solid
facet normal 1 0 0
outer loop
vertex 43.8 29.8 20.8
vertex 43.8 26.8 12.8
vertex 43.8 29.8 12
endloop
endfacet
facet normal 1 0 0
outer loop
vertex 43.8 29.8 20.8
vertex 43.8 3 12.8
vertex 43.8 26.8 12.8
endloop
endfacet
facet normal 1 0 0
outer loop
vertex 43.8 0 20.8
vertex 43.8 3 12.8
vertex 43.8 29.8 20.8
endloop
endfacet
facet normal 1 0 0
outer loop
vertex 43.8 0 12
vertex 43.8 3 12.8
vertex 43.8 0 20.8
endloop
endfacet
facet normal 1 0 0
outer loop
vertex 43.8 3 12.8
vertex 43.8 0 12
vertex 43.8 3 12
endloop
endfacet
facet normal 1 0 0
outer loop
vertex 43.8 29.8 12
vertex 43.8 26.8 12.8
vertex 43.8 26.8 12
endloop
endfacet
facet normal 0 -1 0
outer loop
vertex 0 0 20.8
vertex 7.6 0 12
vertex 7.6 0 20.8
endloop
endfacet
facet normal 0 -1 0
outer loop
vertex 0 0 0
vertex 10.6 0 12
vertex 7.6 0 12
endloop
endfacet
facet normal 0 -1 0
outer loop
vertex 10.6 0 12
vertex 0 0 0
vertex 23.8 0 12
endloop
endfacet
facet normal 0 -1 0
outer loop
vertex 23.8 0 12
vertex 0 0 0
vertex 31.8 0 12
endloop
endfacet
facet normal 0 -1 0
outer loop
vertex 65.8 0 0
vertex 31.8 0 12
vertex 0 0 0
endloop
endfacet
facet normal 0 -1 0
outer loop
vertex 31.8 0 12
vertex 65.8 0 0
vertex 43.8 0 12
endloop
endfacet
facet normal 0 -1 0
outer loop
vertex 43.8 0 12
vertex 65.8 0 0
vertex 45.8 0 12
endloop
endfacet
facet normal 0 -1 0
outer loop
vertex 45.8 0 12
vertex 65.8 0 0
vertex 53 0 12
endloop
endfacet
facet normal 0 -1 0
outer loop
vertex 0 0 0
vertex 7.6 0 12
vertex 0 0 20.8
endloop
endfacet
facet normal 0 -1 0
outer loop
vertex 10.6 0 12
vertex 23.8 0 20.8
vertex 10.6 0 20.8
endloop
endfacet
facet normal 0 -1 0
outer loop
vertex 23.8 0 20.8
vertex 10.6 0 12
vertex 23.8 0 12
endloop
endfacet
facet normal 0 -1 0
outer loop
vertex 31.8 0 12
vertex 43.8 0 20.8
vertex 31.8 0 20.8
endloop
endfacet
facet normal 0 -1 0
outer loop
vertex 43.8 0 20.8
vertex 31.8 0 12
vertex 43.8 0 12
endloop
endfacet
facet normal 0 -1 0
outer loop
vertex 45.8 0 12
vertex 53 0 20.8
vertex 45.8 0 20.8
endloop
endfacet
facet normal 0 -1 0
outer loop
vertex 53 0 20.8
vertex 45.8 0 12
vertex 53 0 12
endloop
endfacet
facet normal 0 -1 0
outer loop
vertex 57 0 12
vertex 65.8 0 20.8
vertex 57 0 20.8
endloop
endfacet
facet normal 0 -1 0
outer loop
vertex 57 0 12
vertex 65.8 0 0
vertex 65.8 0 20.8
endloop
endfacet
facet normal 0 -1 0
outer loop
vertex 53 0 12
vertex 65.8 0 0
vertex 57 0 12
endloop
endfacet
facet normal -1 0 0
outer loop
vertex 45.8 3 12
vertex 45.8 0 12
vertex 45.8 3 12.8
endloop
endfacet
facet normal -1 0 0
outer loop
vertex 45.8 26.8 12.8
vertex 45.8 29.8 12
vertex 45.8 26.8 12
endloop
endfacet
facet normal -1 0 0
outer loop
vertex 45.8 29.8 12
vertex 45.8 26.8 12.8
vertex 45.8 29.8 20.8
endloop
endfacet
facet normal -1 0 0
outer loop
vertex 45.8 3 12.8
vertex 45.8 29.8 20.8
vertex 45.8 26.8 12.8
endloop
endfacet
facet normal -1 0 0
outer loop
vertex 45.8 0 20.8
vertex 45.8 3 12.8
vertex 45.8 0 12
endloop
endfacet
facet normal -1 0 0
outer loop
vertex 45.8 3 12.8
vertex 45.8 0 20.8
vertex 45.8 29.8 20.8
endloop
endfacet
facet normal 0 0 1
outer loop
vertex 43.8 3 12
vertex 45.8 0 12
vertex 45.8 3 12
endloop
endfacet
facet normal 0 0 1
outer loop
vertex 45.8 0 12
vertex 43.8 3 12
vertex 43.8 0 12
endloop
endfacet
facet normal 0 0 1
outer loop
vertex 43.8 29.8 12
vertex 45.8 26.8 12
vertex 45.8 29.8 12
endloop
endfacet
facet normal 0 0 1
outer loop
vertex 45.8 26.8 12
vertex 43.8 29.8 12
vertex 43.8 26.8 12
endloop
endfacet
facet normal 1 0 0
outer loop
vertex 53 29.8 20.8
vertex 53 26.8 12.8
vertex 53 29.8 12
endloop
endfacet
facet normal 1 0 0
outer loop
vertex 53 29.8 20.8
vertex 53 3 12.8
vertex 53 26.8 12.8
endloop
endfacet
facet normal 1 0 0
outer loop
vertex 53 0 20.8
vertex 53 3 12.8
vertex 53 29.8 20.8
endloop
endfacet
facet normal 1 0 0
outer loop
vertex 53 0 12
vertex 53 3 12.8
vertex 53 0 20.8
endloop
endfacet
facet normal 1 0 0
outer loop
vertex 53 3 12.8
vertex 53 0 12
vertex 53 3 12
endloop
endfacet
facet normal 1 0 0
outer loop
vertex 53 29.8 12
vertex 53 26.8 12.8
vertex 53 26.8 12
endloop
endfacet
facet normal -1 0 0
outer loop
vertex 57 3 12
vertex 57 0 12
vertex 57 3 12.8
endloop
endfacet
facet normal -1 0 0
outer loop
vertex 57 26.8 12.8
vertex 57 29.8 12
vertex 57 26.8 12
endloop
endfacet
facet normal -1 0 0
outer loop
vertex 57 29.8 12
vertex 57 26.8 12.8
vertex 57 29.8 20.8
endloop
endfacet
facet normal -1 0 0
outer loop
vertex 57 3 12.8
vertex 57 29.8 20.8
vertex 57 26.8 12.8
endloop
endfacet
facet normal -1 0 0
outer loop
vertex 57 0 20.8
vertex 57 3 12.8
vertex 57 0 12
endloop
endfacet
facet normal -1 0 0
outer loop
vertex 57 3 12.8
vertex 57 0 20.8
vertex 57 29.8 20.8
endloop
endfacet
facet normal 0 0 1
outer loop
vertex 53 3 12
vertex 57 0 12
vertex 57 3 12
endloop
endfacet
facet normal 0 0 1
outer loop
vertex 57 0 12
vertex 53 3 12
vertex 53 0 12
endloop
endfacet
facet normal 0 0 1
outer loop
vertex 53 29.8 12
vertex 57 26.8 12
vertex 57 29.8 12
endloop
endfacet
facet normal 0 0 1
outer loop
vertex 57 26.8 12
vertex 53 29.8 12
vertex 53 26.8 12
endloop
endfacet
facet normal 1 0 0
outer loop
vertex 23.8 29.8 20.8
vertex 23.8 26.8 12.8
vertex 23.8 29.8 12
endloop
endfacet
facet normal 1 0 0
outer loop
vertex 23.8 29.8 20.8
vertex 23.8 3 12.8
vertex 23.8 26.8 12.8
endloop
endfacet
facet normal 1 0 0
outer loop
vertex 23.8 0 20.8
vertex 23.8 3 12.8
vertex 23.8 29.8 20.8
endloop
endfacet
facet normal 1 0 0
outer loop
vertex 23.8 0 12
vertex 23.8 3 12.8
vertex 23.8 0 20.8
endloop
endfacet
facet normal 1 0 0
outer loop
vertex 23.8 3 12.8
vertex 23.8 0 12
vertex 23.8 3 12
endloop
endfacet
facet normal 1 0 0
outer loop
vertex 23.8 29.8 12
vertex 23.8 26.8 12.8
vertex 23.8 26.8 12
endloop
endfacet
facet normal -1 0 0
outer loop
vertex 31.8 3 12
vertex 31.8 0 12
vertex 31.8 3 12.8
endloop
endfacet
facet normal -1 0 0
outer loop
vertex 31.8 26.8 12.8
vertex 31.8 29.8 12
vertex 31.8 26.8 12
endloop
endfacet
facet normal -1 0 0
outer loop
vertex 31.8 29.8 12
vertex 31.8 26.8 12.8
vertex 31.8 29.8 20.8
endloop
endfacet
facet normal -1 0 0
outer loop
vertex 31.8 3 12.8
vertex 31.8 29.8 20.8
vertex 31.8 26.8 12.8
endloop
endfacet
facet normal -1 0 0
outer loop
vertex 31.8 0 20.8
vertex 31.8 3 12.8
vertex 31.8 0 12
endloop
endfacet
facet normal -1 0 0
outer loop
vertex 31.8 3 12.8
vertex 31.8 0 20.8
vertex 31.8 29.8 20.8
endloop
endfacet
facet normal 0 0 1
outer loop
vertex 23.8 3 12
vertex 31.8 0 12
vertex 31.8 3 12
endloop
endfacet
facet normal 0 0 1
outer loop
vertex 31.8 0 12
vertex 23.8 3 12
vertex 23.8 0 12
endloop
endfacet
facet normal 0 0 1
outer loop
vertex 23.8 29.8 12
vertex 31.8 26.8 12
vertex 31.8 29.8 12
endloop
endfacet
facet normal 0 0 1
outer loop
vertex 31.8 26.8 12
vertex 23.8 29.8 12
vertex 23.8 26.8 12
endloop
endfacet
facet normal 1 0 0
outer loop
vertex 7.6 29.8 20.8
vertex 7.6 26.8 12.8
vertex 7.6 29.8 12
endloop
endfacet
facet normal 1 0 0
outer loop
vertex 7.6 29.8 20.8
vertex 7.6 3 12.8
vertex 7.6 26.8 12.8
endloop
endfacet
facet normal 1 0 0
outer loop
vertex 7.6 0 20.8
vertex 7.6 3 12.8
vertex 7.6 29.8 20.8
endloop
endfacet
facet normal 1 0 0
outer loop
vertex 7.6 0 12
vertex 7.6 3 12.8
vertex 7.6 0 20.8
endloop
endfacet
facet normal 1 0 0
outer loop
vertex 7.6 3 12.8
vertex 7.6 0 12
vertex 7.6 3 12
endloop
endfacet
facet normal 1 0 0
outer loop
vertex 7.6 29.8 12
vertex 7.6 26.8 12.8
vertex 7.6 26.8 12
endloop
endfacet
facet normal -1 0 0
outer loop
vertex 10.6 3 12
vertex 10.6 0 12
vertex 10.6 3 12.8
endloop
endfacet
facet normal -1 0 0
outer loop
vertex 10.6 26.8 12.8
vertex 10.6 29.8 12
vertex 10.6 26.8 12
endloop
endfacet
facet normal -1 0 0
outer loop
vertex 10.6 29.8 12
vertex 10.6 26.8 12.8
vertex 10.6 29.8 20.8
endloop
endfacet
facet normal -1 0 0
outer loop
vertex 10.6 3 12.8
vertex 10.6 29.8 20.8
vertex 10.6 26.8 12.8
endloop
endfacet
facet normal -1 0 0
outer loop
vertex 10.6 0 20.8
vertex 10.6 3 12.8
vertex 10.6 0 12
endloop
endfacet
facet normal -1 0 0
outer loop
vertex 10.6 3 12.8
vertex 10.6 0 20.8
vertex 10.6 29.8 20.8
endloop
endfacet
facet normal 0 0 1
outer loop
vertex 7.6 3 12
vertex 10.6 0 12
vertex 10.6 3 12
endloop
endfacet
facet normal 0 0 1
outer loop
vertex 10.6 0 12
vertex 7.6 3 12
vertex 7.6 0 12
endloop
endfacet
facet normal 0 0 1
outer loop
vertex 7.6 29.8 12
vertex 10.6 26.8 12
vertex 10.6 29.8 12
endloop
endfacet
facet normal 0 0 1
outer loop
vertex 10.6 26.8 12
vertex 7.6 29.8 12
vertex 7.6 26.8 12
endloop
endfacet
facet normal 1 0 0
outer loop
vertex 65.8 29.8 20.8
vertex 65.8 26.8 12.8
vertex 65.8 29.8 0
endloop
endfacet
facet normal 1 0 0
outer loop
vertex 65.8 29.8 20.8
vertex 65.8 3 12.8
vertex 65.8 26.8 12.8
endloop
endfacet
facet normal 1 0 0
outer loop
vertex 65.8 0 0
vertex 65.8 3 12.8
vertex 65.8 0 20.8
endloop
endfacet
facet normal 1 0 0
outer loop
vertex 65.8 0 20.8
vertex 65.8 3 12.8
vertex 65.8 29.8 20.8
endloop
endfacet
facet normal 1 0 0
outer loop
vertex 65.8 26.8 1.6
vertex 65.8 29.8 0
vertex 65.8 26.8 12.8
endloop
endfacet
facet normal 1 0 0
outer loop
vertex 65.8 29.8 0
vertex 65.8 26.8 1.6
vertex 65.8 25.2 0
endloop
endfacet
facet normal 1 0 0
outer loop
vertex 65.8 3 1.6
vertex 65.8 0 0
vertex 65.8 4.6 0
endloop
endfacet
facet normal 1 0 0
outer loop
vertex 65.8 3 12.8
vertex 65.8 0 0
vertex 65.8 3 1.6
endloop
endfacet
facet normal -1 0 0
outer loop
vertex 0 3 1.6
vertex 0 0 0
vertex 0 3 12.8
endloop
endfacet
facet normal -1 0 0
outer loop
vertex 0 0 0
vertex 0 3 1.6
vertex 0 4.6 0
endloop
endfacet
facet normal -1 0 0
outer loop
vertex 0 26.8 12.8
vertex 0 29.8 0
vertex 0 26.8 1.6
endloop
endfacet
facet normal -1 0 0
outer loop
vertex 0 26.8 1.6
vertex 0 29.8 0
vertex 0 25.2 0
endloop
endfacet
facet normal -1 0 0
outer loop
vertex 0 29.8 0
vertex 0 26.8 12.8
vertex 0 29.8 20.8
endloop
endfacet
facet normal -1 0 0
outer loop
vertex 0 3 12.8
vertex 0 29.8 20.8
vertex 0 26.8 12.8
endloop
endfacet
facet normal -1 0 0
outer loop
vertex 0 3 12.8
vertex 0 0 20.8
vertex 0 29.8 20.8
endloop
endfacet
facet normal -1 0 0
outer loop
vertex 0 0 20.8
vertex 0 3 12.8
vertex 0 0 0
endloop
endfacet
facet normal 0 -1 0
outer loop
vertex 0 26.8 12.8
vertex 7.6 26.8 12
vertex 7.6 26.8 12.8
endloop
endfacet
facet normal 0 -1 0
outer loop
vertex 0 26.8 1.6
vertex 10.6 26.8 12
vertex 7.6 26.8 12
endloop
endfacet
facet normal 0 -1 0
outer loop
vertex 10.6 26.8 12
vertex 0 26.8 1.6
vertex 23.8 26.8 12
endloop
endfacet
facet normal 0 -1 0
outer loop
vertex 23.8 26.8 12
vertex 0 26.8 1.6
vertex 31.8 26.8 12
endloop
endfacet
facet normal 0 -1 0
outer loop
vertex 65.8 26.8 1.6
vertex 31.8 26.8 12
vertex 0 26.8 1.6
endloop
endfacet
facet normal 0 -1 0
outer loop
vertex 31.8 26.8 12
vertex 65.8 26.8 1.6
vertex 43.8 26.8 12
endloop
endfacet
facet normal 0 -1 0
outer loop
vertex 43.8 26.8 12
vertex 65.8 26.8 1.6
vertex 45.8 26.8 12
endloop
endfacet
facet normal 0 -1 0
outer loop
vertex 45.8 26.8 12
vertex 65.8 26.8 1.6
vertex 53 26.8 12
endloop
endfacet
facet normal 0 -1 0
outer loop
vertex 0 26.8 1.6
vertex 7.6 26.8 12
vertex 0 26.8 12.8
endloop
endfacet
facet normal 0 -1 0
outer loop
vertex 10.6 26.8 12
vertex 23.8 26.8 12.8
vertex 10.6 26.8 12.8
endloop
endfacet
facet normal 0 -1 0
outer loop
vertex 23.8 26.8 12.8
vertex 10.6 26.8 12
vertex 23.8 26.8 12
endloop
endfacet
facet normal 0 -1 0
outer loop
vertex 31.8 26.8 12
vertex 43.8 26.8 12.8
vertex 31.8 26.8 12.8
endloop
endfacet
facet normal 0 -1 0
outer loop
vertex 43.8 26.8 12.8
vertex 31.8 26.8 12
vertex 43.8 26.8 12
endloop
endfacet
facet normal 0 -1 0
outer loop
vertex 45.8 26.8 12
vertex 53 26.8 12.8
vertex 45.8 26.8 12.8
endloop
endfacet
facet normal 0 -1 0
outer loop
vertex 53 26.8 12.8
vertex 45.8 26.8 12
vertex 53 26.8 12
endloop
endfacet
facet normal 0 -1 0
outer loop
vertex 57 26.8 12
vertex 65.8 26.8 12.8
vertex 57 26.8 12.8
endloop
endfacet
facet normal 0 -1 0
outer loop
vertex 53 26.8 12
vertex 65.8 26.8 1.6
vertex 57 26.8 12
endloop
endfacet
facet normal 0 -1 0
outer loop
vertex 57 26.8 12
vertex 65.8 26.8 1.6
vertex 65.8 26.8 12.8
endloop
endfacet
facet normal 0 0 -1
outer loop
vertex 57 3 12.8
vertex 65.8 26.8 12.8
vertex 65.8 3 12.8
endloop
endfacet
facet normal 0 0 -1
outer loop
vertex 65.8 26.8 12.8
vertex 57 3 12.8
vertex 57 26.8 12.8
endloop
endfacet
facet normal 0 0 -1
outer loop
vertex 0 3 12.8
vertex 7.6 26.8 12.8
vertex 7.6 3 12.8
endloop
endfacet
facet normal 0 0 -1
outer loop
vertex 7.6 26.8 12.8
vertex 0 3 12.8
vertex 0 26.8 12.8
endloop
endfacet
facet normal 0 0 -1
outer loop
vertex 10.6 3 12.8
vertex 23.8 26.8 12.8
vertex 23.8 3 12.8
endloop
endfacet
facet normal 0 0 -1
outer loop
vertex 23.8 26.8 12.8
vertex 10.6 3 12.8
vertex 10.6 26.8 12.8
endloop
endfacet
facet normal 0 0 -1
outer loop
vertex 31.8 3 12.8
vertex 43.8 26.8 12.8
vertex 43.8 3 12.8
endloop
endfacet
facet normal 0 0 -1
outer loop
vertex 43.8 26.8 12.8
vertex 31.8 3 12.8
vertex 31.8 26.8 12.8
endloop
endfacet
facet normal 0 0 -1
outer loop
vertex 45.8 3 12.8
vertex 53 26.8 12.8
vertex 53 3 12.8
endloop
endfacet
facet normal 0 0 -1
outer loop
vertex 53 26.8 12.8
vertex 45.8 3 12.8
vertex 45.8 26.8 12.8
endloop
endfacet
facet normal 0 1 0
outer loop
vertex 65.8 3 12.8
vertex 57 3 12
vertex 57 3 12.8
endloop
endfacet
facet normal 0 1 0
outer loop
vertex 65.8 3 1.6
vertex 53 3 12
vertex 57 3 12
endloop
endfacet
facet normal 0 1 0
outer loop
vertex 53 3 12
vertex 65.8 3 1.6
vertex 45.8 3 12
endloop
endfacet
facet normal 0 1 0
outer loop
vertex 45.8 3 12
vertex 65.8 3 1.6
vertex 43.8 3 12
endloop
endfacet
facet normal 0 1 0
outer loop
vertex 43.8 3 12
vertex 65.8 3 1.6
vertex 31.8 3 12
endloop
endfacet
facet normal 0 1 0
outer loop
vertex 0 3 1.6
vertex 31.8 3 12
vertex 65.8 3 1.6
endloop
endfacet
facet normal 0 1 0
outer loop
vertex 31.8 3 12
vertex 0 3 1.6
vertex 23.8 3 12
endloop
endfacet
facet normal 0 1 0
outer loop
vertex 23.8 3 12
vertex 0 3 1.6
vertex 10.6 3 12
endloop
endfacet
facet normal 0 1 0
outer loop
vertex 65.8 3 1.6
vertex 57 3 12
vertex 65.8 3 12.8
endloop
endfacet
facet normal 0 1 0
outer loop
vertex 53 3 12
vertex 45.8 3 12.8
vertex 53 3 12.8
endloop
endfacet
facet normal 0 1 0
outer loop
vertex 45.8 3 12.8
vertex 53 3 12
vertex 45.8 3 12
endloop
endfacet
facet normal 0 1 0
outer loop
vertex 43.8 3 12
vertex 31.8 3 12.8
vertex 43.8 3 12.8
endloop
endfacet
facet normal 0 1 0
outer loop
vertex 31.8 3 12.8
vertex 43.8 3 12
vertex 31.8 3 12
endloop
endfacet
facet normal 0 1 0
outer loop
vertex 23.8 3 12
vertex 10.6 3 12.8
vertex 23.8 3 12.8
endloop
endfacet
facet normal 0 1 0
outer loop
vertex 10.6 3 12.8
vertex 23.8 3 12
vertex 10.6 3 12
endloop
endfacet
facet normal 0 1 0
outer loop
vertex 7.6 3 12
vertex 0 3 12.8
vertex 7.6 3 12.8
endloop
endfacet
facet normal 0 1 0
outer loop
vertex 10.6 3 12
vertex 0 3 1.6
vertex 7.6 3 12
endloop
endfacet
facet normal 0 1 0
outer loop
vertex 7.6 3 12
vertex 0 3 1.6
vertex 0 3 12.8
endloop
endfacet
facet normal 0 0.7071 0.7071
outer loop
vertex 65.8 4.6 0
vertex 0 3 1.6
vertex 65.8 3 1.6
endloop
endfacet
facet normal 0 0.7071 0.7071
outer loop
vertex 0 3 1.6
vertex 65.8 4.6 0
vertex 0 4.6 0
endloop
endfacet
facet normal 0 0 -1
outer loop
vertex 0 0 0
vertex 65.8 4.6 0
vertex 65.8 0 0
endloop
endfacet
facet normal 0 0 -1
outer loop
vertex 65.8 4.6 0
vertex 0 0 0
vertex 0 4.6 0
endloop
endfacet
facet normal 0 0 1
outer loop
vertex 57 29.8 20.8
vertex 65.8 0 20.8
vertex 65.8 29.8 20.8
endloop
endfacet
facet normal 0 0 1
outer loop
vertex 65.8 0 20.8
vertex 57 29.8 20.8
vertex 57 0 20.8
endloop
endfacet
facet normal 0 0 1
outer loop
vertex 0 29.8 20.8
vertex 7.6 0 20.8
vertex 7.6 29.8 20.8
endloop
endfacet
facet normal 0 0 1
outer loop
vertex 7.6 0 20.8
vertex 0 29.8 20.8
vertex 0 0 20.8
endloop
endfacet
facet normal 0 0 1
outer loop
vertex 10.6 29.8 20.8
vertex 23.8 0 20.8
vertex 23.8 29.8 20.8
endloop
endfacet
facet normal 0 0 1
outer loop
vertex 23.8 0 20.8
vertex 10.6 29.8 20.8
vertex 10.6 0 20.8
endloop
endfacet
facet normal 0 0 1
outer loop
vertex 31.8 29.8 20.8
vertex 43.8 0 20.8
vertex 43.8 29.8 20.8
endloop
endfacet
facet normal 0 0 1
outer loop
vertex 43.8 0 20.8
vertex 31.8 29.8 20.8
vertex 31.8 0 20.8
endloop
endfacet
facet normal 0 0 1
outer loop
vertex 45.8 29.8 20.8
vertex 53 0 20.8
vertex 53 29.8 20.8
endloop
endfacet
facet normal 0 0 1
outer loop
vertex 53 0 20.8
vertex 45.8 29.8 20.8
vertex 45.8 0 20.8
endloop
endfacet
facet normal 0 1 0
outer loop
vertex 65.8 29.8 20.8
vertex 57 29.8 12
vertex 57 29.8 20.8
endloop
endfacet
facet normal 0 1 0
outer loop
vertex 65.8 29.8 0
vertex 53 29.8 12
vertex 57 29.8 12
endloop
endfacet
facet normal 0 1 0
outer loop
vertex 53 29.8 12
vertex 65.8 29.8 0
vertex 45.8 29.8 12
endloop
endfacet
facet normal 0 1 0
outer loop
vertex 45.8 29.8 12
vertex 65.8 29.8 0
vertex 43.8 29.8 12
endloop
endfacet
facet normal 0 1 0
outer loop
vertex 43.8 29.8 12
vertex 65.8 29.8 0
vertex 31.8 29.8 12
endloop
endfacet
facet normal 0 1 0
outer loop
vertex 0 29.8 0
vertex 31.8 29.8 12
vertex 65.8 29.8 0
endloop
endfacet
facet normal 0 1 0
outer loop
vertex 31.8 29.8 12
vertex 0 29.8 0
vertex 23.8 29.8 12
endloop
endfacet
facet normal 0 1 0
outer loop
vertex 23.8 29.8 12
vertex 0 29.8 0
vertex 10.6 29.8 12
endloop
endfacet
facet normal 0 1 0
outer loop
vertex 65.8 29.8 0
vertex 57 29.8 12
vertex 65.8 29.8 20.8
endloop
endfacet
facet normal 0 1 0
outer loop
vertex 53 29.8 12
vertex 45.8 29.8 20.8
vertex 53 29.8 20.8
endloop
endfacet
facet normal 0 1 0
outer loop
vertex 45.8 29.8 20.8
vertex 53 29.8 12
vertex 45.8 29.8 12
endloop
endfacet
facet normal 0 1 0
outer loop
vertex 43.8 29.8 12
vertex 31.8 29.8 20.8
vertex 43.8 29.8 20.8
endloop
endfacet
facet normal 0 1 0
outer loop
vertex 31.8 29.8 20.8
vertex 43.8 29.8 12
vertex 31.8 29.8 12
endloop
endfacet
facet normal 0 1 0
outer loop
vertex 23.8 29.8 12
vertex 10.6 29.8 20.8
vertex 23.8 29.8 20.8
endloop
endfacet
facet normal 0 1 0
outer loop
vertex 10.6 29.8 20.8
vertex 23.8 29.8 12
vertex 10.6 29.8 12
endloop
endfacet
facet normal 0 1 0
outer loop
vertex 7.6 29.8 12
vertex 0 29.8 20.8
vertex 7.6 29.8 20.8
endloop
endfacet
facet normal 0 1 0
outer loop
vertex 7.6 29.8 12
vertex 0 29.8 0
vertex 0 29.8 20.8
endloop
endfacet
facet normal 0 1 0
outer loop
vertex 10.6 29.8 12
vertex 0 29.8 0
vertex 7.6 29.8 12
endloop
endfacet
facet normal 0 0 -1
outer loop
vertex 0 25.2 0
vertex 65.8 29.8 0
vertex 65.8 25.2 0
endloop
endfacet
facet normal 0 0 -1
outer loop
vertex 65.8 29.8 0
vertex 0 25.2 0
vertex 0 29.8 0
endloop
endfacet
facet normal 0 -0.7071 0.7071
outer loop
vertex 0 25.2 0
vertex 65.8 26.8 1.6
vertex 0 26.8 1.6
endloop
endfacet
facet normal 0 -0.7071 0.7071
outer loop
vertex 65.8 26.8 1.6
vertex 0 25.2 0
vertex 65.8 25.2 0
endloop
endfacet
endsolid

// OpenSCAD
/* [Fixed] */

// parallel to board
magnet_h = 23.8 * 1;

// parallel to board
magnet_d = 12.8 * 1;

/* [Fitting] */

lip_h = 1.6; // [0:0.1:5]
lip_d = 1.6; // [0:0.1:5]

clip_thickness = 3.0; // [0:0.1:10]

/* [Size] */

// over/under the magnet
cutout_thickness = -0.8; // [-2:0.01:2]

// out from magnet
cutout_depth = 8; // [0:1:20]

/* [Cutouts] */

// left and right multiple of each cutout width
cutout_spacing = 1.2; // [0.1:0.1:5]

// left of cutouts
cutout_padding_l = 4; // [0:0.1:20]

// right of cutouts
cutout_padding_r = 4; // [0:0.1:20]

// width from left to right
cutout_widths_1 = [3, 8, 2, 4]; // [0:0.1:20]
cutout_widths_2 = [0, 0, 0, 0]; // [0:0.1:20]
cutout_widths_3 = [0, 0, 0, 0]; // [0:0.1:20]
cutout_widths_4 = [0, 0, 0, 0]; // [0:0.1:20]

// customiser can't go higher than vector length 4
cutout_widths = concat(cutout_widths_1, cutout_widths_2, cutout_widths_3, cutout_widths_4);

function calc_length(i = 0) =
  i < len(cutout_widths) && cutout_widths[i] > 0 ?
    cutout_widths[i] * (1 + cutout_spacing * 2) + calc_length(i + 1)
  : cutout_padding_l + cutout_padding_r;

length = calc_length();

module body() {

  translate(v=[length, 0, 0])
    rotate(a=270, v=[0, 1, 0])
      linear_extrude(height=length) {
        difference() {

          // outer shell
          square(
            [
              magnet_d + cutout_depth,
              magnet_h + clip_thickness * 2,
            ], center=false
          );

          // magnet channel
          translate(v=[0, clip_thickness])
            square(
              [
                magnet_d,
                magnet_h,
              ], center=false
            );
        }

        // bottom lip
        translate(v=[0, clip_thickness])
          polygon(
            [
              [0, 0],
              [0, lip_h],
              [lip_d, 0],
            ]
          );

        // top lip
        translate(v=[0, magnet_h + clip_thickness])
          polygon(
            [
              [0, 0],
              [0, -lip_h],
              [lip_d, 0],
            ]
          );
      }
}

module cutouts(i = 0, x = cutout_padding_l) {
  w = cutout_widths[i];
  s = w * cutout_spacing;
  echo(i=i, w=w, x=x, s=s);

  // add a small amount for nicer scad and orcaslicer rendering; rounding error?
  h = magnet_h + clip_thickness * 2 + 1;

  translate(v=[x + s, h, magnet_d + cutout_thickness])
    rotate(a=90, v=[1, 0, 0])
      linear_extrude(height=h)
        square([cutout_widths[i], cutout_depth - cutout_thickness]);

  if (i + 1 < len(cutout_widths) && cutout_widths[i + 1] > 0) {
    cutouts(i + 1, x + w + s * 2);
  }
}

render() {
  difference() {
    color(c="green")
      body();

    color(c="red")
      cutouts();
  }
}
